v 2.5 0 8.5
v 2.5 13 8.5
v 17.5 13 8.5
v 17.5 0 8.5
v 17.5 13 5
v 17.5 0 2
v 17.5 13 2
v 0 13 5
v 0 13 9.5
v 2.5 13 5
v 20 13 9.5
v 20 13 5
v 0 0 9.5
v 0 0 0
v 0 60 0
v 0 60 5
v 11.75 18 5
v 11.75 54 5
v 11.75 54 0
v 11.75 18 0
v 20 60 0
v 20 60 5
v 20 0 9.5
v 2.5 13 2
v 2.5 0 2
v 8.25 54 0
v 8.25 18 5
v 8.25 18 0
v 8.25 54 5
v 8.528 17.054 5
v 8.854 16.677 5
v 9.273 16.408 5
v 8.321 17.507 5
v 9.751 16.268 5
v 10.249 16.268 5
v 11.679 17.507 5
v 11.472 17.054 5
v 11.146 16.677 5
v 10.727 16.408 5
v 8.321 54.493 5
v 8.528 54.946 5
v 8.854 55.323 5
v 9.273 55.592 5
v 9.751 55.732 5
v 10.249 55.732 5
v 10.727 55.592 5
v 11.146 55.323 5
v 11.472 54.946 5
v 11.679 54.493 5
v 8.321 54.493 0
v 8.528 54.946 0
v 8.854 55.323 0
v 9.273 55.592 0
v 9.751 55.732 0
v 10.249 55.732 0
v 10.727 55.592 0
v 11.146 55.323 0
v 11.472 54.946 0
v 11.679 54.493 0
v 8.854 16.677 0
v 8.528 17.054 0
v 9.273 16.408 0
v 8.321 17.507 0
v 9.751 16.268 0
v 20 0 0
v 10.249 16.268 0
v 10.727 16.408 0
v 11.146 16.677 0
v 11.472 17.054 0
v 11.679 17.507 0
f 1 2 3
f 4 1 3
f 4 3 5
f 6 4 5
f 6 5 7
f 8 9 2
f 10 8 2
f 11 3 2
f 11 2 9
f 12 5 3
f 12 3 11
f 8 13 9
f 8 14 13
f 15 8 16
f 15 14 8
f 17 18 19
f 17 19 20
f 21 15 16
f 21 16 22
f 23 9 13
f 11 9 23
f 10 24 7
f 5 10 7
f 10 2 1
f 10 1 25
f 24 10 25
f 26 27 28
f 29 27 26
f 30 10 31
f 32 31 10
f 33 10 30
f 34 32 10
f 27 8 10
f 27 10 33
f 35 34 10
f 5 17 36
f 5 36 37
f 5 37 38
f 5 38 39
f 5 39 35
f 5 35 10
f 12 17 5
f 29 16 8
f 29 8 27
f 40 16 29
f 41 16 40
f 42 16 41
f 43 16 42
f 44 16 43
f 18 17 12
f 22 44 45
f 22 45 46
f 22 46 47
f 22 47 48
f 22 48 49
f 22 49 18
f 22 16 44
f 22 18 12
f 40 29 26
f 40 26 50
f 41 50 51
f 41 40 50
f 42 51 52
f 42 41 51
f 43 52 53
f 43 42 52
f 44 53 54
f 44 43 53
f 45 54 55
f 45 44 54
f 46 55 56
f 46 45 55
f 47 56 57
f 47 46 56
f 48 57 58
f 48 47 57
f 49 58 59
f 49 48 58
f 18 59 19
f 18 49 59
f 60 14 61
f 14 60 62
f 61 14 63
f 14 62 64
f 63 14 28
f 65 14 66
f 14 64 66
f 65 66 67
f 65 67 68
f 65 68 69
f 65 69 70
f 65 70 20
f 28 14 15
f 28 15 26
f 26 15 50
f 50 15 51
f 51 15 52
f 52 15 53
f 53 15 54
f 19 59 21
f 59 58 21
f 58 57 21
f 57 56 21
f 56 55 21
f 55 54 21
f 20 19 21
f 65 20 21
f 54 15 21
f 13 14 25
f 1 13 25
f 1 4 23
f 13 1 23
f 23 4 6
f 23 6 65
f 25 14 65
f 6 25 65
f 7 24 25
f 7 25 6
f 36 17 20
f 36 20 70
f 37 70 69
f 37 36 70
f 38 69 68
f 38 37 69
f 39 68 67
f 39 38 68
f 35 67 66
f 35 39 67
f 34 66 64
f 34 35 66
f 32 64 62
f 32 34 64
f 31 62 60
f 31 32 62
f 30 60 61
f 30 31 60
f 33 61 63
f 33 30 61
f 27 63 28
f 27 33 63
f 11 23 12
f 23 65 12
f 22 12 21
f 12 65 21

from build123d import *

# Parameters (mm, degrees)
SKETCH1_W           = 20
SKETCH1_H           = 60
BOSS_EXTRUDE1_DEPTH = 5
SKETCH2_W           = 20
SKETCH2_H           = 13
BOSS_EXTRUDE2_DEPTH = 4.5
SKETCH3_W           = 15
SKETCH3_H           = 6.5
CUT_EXTRUDE1_DEPTH  = 14
CUT_EXTRUDE2_DEPTH  = 10


with BuildPart() as part:
    # Sketch1 → Boss-Extrude1 (new body)
    with BuildSketch(Plane.XY):
        with Locations((10, 30)):
            Rectangle(SKETCH1_W, SKETCH1_H)
    extrude(amount=BOSS_EXTRUDE1_DEPTH)

    # Sketch2 → Boss-Extrude2 (add)
    with BuildSketch(Plane.XY.offset(5)):
        with Locations((10, 6.5)):
            Rectangle(SKETCH2_W, SKETCH2_H)
    extrude(amount=BOSS_EXTRUDE2_DEPTH)

    # Sketch3 → Cut-Extrude1 (cut, through all)
    with BuildSketch(Plane(origin=(0, 13, 0), x_dir=(1, 0, 0), z_dir=(0, 1, 0))):
        with Locations((10, -5.25)):
            Rectangle(SKETCH3_W, SKETCH3_H)
    extrude(amount=-CUT_EXTRUDE1_DEPTH, mode=Mode.SUBTRACT)

    # Sketch4 → Cut-Extrude2 (cut)
    with BuildSketch(Plane.XY.offset(5)):
        with BuildLine():
            Line((11.75, 54), (11.75, 18))
            ThreePointArc((11.75, 18), (10, 16.25), (8.25, 18))
            Line((8.25, 18), (8.25, 54))
            ThreePointArc((8.25, 54), (10, 55.75), (11.75, 54))
        make_face()
    extrude(amount=-CUT_EXTRUDE2_DEPTH, mode=Mode.SUBTRACT)


solid = part.part
